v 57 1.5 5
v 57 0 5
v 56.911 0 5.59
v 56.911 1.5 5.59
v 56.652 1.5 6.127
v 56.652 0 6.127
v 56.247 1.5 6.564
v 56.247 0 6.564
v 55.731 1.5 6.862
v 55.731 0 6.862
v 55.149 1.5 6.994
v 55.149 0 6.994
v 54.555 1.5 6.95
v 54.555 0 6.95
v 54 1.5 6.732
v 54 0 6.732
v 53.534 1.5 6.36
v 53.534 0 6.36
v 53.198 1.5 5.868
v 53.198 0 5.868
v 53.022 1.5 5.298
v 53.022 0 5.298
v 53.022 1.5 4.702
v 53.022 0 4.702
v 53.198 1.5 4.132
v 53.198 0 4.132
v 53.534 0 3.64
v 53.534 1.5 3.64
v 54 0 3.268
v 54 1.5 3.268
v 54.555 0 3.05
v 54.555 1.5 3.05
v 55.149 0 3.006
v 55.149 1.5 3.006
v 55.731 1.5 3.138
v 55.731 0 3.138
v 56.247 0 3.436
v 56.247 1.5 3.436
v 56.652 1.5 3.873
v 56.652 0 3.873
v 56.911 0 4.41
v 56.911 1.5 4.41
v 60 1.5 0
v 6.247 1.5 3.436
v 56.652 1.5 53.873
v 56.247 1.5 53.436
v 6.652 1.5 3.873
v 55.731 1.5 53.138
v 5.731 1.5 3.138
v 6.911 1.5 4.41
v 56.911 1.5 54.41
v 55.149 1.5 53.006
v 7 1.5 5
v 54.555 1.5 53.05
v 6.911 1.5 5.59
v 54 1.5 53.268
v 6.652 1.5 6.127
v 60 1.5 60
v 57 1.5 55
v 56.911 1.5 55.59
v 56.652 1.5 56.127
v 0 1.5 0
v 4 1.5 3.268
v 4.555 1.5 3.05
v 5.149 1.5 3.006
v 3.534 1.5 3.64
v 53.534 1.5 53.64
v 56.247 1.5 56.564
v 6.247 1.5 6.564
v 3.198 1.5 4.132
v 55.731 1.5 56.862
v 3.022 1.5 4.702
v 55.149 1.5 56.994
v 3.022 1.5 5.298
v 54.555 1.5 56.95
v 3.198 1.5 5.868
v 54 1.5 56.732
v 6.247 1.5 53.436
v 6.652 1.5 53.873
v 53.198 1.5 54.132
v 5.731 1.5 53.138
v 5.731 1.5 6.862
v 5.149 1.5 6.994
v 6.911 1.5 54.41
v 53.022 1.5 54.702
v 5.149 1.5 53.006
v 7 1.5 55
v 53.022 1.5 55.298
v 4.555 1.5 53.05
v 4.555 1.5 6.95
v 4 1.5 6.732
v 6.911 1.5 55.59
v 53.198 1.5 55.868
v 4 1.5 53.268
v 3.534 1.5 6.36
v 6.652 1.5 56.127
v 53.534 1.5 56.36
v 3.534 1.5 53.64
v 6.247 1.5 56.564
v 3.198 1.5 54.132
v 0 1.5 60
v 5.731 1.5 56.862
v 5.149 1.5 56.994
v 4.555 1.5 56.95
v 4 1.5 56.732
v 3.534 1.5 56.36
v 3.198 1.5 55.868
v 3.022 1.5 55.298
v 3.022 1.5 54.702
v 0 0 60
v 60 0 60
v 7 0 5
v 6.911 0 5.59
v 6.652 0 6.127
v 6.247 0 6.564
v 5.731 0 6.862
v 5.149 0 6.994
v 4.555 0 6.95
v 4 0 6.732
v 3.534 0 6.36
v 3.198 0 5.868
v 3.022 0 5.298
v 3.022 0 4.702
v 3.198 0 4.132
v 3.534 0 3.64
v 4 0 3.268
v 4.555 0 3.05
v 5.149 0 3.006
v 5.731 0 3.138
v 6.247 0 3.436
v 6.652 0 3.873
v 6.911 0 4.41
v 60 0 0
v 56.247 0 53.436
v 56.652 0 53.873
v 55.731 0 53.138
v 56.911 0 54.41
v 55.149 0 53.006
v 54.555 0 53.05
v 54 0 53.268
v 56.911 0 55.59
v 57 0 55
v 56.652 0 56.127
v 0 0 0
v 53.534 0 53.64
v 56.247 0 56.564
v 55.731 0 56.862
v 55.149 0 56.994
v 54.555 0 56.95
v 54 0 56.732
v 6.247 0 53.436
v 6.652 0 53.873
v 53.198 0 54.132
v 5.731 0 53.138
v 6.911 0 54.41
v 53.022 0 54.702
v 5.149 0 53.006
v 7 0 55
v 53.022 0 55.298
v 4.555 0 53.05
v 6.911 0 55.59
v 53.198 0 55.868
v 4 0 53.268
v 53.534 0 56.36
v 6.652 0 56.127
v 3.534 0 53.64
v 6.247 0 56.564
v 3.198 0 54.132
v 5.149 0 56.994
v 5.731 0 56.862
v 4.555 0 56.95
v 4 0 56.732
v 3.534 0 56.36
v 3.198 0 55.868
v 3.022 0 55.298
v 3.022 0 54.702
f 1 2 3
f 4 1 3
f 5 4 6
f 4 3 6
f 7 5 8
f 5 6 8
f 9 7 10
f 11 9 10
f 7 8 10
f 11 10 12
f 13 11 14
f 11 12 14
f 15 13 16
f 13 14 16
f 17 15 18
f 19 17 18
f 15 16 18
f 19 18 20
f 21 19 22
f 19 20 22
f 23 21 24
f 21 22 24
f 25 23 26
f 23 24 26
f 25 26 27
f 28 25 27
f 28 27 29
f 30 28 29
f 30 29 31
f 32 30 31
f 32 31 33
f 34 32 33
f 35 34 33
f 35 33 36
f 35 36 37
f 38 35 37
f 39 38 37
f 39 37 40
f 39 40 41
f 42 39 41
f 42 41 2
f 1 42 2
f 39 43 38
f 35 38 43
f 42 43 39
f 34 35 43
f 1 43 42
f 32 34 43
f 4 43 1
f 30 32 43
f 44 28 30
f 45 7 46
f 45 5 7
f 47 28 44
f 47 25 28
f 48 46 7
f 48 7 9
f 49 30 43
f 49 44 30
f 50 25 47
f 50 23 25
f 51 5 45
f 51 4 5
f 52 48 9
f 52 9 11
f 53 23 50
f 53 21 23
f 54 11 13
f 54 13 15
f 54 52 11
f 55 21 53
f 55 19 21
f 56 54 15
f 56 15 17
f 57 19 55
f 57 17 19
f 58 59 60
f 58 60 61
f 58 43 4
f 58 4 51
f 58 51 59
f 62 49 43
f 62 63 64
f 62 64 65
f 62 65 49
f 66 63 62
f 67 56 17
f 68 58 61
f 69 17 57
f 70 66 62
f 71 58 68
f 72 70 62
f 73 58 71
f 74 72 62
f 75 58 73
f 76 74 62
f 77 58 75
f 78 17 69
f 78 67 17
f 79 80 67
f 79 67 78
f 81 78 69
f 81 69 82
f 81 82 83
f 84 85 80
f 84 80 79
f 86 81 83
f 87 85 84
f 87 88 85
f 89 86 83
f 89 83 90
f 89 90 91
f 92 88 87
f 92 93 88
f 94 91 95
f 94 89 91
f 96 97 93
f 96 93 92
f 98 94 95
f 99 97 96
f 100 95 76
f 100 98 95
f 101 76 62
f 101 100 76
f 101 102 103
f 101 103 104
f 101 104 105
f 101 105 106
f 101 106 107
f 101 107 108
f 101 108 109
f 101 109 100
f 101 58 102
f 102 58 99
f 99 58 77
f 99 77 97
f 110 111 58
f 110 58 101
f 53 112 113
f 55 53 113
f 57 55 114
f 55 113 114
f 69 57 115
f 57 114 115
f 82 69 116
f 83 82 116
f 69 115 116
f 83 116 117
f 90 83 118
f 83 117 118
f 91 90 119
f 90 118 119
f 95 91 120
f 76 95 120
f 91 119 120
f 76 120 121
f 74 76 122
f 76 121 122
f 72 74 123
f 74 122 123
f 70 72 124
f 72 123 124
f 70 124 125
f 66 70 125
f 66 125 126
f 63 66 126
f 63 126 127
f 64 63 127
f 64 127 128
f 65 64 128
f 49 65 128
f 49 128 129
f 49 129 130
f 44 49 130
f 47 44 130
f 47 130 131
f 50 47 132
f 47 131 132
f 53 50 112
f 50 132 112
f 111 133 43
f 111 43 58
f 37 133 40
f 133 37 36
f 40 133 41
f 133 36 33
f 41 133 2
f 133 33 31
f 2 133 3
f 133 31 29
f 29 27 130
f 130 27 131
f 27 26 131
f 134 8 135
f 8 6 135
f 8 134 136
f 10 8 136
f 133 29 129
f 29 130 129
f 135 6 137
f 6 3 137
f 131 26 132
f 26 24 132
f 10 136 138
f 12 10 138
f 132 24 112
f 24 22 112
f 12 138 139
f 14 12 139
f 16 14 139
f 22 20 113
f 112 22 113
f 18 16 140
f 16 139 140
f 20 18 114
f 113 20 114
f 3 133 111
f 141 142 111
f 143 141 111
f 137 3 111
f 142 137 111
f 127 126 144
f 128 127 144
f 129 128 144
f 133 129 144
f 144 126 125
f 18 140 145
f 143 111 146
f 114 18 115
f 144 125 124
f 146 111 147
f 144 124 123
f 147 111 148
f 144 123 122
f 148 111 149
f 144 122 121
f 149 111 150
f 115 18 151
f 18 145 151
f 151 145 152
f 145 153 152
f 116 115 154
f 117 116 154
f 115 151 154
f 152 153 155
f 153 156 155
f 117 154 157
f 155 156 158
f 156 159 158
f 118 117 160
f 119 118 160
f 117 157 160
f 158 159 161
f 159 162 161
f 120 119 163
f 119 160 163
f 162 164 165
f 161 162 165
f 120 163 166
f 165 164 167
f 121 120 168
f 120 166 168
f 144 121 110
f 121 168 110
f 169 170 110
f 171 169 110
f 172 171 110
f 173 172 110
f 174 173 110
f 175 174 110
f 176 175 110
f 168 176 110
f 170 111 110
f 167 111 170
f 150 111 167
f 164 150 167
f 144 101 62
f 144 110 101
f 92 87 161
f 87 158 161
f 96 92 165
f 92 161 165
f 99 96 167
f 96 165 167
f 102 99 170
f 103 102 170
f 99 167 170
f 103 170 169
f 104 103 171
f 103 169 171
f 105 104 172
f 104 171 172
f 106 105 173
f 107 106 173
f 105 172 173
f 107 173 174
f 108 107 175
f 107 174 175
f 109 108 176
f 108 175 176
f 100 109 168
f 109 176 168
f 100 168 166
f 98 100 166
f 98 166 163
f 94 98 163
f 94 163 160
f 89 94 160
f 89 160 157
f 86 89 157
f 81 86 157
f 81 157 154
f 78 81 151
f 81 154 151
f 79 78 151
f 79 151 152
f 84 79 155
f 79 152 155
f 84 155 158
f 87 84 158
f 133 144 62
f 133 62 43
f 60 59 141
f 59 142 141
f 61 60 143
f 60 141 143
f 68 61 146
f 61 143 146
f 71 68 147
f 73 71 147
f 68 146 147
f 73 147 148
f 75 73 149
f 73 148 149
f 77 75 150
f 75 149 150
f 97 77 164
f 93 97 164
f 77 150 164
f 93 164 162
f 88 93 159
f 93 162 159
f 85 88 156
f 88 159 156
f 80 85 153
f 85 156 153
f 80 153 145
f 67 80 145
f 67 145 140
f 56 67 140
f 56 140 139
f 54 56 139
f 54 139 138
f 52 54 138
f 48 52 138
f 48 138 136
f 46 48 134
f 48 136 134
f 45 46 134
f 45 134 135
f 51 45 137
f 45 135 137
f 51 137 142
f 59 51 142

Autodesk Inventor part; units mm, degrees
ref_plane "YZ Plane" through (0, 0, 0) normal (1, 0, 0) x (0, 1, 0)
ref_plane "XZ Plane" through (0, 0, 0) normal (0, 1, 0) x (-1, 0, 0)
ref_plane "XY Plane" through (0, 0, 0) normal (0, 0, 1) x (1, 0, 0)
sketch "Sketch1" plane through (0, 0, 0) normal (0, 1, 0) x (-1, 0, 0)
  line L0 (0, 0) -> (-60, 0)
  line L1 (-60, 0) -> (-60, 60)
  line L2 (-60, 60) -> (0, 60)
  line L3 (0, 60) -> (0, 0)
  dimension "d0" = 60
  dimension "d1" = 60
extrude "Extrusion1" add sketch "Sketch1" along normal blind 1.5
sketch "Sketch2" plane through (0, 0, 0) normal (0, -1, 0) x (1, 0, 0)
  circle A0 centre (5, 5) radius 2
  circle A1 centre (5, 55) radius 2
  circle A2 centre (55, 55) radius 2
  circle A3 centre (55, 5) radius 2
  line L0 (60, 60) -> (0, 60) projected
  line L1 (60, 0) -> (60, 60) projected
  line L2 (0, 60) -> (0, 0) projected
  line L3 (0, 0) -> (60, 0) projected
  dimension "d4" = 4
  dimension "d5" = 4
  dimension "d6" = 4
  dimension "d7" = 4
  dimension "d8" = 5
  dimension "d9" = 5
  dimension "d10" = 5
  dimension "d11" = 5
  dimension "d12" = 5
  dimension "d13" = 5
  dimension "d14" = 5
  dimension "d15" = 5
extrude "Extrusion2" cut sketch "Sketch2" against normal blind 1.5 keep common part
properties part number "Deksel"
